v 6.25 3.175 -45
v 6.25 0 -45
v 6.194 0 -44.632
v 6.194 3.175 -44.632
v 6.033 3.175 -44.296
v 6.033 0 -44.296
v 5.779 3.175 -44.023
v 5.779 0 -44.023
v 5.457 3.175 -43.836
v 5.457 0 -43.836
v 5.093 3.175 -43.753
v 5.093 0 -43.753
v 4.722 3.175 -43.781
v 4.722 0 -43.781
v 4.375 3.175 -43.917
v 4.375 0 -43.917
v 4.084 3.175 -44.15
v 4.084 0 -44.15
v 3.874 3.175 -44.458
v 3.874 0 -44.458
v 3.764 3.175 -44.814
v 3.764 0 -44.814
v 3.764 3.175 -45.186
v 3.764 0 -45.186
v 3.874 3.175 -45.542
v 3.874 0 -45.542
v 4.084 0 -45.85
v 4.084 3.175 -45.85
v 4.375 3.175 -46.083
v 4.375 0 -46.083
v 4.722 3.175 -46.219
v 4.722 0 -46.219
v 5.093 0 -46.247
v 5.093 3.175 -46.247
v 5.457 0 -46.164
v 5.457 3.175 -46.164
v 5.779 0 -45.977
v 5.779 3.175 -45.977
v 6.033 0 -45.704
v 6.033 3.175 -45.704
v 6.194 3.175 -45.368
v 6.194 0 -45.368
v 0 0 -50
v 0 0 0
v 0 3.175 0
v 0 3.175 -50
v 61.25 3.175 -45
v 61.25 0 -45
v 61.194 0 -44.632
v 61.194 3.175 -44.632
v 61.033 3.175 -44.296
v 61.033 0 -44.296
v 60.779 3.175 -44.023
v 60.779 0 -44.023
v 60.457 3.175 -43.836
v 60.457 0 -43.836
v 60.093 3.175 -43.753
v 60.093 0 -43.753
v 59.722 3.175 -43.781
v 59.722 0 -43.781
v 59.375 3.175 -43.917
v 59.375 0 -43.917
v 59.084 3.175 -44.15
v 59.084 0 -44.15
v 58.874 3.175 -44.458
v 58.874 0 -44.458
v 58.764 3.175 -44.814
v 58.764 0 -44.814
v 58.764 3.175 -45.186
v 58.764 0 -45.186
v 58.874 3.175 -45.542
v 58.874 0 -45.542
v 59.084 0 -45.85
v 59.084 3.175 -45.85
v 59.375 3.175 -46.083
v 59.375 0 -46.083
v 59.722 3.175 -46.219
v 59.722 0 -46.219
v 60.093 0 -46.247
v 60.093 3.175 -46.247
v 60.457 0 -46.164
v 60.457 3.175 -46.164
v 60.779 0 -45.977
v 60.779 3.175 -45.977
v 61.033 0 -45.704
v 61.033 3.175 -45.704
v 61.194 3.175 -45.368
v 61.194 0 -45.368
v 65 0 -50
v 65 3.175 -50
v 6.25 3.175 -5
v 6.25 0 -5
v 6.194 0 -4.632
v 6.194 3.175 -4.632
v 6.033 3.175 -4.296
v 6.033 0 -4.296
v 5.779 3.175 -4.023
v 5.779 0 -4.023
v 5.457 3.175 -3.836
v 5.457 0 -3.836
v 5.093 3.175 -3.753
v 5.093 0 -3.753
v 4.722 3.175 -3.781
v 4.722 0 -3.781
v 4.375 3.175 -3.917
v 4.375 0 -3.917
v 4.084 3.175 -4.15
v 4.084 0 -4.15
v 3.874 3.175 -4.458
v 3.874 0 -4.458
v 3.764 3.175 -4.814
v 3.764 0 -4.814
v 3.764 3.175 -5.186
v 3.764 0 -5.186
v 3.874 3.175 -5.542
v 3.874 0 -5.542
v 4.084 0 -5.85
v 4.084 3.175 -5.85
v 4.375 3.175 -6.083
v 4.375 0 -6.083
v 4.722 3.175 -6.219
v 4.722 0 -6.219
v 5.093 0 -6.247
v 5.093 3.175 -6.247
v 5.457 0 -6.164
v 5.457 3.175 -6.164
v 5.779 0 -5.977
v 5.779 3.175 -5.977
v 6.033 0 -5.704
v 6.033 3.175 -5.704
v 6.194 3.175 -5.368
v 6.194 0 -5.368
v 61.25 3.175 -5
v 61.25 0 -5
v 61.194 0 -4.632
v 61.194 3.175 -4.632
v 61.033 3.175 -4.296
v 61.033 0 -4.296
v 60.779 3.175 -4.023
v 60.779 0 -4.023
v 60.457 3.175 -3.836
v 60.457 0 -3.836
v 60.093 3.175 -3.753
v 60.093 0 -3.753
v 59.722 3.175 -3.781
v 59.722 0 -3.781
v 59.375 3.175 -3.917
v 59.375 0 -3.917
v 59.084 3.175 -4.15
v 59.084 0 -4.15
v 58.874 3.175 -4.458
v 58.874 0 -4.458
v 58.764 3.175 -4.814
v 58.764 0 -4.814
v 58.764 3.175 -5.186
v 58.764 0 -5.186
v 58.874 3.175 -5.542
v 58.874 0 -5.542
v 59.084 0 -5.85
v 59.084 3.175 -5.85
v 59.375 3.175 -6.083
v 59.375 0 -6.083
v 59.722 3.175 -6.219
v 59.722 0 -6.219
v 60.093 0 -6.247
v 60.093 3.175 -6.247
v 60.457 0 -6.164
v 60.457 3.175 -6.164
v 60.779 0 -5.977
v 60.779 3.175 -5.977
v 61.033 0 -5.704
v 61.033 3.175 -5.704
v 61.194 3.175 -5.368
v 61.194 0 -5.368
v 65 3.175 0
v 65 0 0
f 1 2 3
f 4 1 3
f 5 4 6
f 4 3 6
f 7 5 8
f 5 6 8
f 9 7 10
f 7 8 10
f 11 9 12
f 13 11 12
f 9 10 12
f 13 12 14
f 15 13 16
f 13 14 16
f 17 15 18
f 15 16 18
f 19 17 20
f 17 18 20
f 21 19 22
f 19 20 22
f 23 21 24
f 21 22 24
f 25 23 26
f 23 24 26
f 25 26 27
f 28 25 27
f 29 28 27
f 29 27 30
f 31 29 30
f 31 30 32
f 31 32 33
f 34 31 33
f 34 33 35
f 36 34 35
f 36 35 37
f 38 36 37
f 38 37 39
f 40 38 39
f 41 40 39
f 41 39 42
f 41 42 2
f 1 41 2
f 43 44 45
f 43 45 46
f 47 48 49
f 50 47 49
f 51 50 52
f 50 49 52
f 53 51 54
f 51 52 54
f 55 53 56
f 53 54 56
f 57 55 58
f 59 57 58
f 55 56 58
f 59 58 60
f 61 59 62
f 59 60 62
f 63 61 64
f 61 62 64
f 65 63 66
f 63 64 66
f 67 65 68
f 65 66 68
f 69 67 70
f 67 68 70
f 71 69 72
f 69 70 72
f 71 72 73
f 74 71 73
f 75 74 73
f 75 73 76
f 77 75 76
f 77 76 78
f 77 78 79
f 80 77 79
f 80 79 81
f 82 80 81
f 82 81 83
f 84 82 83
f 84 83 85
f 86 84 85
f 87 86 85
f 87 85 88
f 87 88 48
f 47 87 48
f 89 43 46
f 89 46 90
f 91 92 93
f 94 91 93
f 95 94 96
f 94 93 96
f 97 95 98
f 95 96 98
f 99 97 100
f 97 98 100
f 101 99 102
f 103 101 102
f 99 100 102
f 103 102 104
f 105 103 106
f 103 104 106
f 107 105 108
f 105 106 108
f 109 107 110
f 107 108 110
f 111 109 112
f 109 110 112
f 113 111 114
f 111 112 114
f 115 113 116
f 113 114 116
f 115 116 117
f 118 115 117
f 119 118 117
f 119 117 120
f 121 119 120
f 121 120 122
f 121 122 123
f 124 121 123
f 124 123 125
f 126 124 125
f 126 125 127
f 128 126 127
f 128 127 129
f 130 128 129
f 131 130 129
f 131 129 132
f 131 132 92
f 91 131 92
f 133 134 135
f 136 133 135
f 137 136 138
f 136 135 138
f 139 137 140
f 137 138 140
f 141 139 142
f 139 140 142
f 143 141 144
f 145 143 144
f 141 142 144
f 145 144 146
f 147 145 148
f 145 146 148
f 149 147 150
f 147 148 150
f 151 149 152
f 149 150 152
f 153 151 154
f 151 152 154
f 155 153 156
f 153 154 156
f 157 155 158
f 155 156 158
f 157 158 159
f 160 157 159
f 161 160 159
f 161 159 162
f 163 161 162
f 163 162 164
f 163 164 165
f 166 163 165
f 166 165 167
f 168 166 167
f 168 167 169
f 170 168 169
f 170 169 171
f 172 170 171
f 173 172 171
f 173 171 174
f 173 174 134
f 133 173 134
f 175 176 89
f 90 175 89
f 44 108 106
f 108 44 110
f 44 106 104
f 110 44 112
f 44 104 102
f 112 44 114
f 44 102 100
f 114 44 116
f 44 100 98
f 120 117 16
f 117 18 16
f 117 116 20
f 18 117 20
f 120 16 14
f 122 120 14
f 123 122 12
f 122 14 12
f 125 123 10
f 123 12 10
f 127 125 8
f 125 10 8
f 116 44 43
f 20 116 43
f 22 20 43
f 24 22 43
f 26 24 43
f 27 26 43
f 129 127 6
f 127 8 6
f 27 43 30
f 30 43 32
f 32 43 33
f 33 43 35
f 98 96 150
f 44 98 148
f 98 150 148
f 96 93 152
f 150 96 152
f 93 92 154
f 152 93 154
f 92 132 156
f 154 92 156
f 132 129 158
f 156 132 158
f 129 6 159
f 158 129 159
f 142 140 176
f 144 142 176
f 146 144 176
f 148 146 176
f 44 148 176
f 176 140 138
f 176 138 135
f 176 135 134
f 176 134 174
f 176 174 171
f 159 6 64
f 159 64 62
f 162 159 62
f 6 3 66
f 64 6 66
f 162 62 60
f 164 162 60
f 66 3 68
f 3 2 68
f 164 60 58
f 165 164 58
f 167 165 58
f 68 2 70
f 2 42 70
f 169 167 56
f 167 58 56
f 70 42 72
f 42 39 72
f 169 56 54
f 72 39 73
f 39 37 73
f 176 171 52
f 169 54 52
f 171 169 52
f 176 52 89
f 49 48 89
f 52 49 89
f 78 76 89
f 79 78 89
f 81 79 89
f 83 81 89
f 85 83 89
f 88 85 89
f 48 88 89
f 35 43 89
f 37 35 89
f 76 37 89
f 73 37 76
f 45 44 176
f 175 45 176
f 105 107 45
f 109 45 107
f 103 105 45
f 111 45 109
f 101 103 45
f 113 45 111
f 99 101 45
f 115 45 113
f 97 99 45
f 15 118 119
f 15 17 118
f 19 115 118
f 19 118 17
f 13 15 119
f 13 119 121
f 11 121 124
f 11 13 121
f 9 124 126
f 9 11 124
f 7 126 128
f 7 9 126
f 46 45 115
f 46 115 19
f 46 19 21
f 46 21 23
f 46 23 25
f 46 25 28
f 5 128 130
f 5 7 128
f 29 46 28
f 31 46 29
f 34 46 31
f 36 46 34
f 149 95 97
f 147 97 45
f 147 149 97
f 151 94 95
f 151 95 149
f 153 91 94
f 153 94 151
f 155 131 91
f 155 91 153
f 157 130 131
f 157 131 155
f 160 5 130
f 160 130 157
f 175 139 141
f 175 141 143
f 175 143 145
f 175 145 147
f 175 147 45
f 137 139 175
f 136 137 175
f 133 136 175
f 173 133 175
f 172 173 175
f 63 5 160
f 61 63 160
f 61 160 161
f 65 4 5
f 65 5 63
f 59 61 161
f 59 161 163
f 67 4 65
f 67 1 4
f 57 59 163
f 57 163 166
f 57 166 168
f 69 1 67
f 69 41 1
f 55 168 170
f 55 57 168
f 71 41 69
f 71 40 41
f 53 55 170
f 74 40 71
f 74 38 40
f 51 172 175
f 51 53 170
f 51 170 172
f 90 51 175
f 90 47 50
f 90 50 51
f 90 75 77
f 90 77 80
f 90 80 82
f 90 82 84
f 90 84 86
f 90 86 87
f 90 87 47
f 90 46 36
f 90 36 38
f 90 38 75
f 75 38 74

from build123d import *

# Parameters (mm, degrees)
SKETCH1_W                 = 65
SKETCH1_H                 = 50
BOSS_EXTRUDE1_DEPTH       = 3.175
M3X0_5_TAPPED_HOLE1_D     = 2.5
M3X0_5_TAPPED_HOLE1_DEPTH = 7.5
M3X0_5_TAPPED_HOLE1_TIP   = 0.751075774


with BuildPart() as part:
    # Sketch1 → Boss-Extrude1 (new body)
    with BuildSketch(Plane(origin=(0, 0, 0), x_dir=(1, 0, 0), z_dir=(0, 1, 0))):
        with Locations((32.5, 25)):
            Rectangle(SKETCH1_W, SKETCH1_H)
    extrude(amount=BOSS_EXTRUDE1_DEPTH)

    # M3x0.5 Tapped Hole1
    with Locations(Plane(origin=(0, 3.175, 0), x_dir=(-1, 0, 0), z_dir=(0, 1, 0))):
        with Locations((-5, -45), (-60, -45), (-60, -5), (-5, -5)):
            Hole(M3X0_5_TAPPED_HOLE1_D / 2, depth=M3X0_5_TAPPED_HOLE1_DEPTH)
            with Locations((0, 0, -(M3X0_5_TAPPED_HOLE1_DEPTH + M3X0_5_TAPPED_HOLE1_TIP / 2))):  # 118° drill point
                Cone(0, M3X0_5_TAPPED_HOLE1_D / 2, M3X0_5_TAPPED_HOLE1_TIP, mode=Mode.SUBTRACT)


solid = part.part
